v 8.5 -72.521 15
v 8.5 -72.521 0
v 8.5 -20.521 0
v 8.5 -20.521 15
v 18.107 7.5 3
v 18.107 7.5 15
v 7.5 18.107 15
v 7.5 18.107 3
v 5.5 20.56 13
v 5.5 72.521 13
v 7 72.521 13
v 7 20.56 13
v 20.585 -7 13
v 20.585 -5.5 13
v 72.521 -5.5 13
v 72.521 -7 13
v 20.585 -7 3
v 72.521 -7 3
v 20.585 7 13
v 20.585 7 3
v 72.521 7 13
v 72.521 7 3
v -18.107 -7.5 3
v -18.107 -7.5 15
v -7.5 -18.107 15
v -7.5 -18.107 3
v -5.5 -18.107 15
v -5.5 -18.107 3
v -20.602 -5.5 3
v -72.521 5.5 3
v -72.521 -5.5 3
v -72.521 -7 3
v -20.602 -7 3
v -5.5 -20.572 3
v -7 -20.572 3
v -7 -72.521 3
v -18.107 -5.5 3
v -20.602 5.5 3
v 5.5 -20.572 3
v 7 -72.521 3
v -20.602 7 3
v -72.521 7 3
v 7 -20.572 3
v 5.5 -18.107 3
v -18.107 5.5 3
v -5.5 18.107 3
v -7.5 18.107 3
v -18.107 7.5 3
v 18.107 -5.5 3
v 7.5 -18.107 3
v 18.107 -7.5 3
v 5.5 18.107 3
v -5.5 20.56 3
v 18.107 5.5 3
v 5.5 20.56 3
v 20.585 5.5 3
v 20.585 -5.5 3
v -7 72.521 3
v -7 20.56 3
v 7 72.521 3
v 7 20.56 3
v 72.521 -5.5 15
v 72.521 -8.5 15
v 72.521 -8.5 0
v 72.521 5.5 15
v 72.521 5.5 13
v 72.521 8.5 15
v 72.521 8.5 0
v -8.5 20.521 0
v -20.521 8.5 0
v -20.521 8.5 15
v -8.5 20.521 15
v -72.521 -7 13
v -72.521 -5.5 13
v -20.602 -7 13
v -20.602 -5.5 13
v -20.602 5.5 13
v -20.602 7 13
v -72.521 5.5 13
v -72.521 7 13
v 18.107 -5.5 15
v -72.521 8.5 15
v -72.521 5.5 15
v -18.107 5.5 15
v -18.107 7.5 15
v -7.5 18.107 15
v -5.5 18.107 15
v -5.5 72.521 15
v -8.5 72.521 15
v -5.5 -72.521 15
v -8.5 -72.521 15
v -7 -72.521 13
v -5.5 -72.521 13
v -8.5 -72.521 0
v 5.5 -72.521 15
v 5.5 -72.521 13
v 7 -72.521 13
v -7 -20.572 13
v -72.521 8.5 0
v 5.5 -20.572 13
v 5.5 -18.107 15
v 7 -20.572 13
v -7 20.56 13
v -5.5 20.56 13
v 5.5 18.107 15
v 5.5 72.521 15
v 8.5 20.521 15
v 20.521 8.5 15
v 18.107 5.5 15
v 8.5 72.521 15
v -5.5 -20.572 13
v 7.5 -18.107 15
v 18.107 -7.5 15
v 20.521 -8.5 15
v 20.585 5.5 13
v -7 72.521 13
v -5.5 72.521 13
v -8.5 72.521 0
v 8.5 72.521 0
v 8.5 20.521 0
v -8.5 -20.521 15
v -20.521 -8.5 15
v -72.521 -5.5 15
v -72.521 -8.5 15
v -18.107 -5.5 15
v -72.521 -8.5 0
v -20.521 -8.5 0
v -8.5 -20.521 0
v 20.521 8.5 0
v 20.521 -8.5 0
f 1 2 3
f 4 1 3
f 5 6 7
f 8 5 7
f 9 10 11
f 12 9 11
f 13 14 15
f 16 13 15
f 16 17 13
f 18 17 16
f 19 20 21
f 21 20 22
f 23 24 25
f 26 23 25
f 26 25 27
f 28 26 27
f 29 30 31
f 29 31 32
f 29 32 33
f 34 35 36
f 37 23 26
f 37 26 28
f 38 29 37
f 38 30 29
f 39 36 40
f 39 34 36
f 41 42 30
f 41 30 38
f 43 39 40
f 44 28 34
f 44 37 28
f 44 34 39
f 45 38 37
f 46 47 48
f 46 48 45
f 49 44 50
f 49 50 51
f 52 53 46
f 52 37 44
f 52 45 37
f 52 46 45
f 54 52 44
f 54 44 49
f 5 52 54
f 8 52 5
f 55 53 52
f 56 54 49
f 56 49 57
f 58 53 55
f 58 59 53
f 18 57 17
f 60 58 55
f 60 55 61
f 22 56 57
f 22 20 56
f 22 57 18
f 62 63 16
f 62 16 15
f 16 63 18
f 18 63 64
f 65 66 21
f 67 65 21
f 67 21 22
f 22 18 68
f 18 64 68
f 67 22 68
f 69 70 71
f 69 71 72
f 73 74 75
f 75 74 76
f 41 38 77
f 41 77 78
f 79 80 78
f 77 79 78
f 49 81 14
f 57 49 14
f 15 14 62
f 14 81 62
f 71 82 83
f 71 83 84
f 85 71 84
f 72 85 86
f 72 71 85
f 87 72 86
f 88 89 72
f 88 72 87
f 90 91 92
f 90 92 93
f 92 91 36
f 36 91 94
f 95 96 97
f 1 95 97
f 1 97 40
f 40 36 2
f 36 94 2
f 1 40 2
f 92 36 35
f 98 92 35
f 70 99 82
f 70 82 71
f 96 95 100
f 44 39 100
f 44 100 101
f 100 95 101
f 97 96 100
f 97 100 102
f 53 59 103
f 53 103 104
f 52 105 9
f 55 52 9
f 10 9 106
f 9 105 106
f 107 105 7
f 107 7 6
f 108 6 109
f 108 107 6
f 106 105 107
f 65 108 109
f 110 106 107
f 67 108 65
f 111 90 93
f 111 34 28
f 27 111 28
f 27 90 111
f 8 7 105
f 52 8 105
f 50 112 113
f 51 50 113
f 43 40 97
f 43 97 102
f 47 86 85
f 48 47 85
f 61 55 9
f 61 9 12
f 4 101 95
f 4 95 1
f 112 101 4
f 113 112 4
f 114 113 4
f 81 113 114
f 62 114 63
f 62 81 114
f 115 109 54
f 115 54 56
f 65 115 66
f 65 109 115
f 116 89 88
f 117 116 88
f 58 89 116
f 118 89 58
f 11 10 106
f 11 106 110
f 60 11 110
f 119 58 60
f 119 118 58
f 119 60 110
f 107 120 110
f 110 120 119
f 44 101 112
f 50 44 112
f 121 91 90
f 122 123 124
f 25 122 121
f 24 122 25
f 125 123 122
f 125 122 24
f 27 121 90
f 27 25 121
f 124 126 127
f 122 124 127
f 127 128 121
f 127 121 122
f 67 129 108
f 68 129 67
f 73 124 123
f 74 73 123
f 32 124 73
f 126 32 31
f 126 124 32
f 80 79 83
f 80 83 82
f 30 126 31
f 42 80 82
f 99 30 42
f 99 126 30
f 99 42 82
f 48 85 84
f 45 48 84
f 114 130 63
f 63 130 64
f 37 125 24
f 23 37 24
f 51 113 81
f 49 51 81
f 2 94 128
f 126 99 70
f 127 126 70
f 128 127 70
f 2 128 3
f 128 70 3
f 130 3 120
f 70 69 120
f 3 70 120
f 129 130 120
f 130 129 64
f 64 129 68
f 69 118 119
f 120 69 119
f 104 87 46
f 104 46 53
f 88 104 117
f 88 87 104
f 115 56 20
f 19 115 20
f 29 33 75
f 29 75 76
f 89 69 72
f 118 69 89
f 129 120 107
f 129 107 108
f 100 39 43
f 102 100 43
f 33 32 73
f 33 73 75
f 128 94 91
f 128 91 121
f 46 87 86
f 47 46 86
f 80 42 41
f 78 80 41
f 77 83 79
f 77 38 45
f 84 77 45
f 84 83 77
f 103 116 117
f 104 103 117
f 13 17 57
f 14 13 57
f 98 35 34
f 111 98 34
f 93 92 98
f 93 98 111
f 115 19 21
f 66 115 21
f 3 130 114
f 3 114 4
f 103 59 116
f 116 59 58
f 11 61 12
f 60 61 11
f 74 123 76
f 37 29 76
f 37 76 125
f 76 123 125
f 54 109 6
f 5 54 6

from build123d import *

# Parameters (mm, degrees)
SKETCH_1_W          = 52
SKETCH_1_H          = 17
SKETCH_1_W_2        = 17
SKETCH_1_H_2        = 52
EXTRUDE_1_DEPTH     = 15
SKETCH_8_W          = 11
SKETCH_8_H          = 54.414213562
SKETCH_8_W_2        = 54.414213562
SKETCH_8_H_2        = 11
CUT_EXTRUDE_2_DEPTH = 12
SKETCH_9_W          = 51.918987987
SKETCH_9_H          = 14
SKETCH_9_W_2        = 14
SKETCH_9_H_2        = 51.960636612
SKETCH_9_W_3        = 51.935924336
SKETCH_9_H_3        = 51.948438094
CUT_EXTRUDE_3_DEPTH = 10


with BuildPart() as part:
    # Эскиз1 → Бобышка-Вытянуть1 (new body)
    with BuildSketch(Plane.XY):
        with Locations((-46.52081528, 0)):
            Rectangle(SKETCH_1_W, SKETCH_1_H)
        Polygon((20.52081528, 8.5), (20.52081528, -8.5), (8.5, -20.52081528), (-8.5, -20.52081528), (-20.52081528, -8.5), (-20.52081528, 8.5), (-8.5, 20.52081528), (8.5, 20.52081528), align=None)
        with Locations((0, 46.52081528)):
            Rectangle(SKETCH_1_W_2, SKETCH_1_H_2)
        with Locations((46.52081528, 0)):
            Rectangle(SKETCH_1_W, SKETCH_1_H)
        with Locations((0, -46.52081528)):
            Rectangle(SKETCH_1_W_2, SKETCH_1_H_2)
    extrude(amount=EXTRUDE_1_DEPTH)

    # Эскиз8 → Вырез-Вытянуть2 (cut)
    with BuildSketch(Plane.XY.offset(15)):
        with Locations((0, 45.313708499)):
            Rectangle(SKETCH_8_W, SKETCH_8_H)
        Polygon((7.5, -18.106601718), (18.106601718, -7.5), (18.106601718, 7.5), (7.5, 18.106601718), (-7.5, 18.106601718), (-18.106601718, 7.5), (-18.106601718, -7.5), (-7.5, -18.106601718), align=None)
        with Locations((45.313708499, 0)):
            Rectangle(SKETCH_8_W_2, SKETCH_8_H_2)
        with Locations((0, -45.313708499)):
            Rectangle(SKETCH_8_W, SKETCH_8_H)
        with Locations((-45.313708499, 0)):
            Rectangle(SKETCH_8_W_2, SKETCH_8_H_2)
    extrude(amount=-CUT_EXTRUDE_2_DEPTH, mode=Mode.SUBTRACT)

    # Эскиз9 → Вырез-Вытянуть3 (cut)
    with BuildSketch(Plane.XY.offset(3)):
        with Locations((-46.561321287, 0)):
            Rectangle(SKETCH_9_W, SKETCH_9_H)
        with Locations((0, 46.540496974)):
            Rectangle(SKETCH_9_W_2, SKETCH_9_H_2)
        with Locations((46.552853112, 0)):
            Rectangle(SKETCH_9_W_3, SKETCH_9_H)
        with Locations((0, -46.546596233)):
            Rectangle(SKETCH_9_W_2, SKETCH_9_H_3)
    extrude(amount=CUT_EXTRUDE_3_DEPTH, mode=Mode.SUBTRACT)


solid = part.part
